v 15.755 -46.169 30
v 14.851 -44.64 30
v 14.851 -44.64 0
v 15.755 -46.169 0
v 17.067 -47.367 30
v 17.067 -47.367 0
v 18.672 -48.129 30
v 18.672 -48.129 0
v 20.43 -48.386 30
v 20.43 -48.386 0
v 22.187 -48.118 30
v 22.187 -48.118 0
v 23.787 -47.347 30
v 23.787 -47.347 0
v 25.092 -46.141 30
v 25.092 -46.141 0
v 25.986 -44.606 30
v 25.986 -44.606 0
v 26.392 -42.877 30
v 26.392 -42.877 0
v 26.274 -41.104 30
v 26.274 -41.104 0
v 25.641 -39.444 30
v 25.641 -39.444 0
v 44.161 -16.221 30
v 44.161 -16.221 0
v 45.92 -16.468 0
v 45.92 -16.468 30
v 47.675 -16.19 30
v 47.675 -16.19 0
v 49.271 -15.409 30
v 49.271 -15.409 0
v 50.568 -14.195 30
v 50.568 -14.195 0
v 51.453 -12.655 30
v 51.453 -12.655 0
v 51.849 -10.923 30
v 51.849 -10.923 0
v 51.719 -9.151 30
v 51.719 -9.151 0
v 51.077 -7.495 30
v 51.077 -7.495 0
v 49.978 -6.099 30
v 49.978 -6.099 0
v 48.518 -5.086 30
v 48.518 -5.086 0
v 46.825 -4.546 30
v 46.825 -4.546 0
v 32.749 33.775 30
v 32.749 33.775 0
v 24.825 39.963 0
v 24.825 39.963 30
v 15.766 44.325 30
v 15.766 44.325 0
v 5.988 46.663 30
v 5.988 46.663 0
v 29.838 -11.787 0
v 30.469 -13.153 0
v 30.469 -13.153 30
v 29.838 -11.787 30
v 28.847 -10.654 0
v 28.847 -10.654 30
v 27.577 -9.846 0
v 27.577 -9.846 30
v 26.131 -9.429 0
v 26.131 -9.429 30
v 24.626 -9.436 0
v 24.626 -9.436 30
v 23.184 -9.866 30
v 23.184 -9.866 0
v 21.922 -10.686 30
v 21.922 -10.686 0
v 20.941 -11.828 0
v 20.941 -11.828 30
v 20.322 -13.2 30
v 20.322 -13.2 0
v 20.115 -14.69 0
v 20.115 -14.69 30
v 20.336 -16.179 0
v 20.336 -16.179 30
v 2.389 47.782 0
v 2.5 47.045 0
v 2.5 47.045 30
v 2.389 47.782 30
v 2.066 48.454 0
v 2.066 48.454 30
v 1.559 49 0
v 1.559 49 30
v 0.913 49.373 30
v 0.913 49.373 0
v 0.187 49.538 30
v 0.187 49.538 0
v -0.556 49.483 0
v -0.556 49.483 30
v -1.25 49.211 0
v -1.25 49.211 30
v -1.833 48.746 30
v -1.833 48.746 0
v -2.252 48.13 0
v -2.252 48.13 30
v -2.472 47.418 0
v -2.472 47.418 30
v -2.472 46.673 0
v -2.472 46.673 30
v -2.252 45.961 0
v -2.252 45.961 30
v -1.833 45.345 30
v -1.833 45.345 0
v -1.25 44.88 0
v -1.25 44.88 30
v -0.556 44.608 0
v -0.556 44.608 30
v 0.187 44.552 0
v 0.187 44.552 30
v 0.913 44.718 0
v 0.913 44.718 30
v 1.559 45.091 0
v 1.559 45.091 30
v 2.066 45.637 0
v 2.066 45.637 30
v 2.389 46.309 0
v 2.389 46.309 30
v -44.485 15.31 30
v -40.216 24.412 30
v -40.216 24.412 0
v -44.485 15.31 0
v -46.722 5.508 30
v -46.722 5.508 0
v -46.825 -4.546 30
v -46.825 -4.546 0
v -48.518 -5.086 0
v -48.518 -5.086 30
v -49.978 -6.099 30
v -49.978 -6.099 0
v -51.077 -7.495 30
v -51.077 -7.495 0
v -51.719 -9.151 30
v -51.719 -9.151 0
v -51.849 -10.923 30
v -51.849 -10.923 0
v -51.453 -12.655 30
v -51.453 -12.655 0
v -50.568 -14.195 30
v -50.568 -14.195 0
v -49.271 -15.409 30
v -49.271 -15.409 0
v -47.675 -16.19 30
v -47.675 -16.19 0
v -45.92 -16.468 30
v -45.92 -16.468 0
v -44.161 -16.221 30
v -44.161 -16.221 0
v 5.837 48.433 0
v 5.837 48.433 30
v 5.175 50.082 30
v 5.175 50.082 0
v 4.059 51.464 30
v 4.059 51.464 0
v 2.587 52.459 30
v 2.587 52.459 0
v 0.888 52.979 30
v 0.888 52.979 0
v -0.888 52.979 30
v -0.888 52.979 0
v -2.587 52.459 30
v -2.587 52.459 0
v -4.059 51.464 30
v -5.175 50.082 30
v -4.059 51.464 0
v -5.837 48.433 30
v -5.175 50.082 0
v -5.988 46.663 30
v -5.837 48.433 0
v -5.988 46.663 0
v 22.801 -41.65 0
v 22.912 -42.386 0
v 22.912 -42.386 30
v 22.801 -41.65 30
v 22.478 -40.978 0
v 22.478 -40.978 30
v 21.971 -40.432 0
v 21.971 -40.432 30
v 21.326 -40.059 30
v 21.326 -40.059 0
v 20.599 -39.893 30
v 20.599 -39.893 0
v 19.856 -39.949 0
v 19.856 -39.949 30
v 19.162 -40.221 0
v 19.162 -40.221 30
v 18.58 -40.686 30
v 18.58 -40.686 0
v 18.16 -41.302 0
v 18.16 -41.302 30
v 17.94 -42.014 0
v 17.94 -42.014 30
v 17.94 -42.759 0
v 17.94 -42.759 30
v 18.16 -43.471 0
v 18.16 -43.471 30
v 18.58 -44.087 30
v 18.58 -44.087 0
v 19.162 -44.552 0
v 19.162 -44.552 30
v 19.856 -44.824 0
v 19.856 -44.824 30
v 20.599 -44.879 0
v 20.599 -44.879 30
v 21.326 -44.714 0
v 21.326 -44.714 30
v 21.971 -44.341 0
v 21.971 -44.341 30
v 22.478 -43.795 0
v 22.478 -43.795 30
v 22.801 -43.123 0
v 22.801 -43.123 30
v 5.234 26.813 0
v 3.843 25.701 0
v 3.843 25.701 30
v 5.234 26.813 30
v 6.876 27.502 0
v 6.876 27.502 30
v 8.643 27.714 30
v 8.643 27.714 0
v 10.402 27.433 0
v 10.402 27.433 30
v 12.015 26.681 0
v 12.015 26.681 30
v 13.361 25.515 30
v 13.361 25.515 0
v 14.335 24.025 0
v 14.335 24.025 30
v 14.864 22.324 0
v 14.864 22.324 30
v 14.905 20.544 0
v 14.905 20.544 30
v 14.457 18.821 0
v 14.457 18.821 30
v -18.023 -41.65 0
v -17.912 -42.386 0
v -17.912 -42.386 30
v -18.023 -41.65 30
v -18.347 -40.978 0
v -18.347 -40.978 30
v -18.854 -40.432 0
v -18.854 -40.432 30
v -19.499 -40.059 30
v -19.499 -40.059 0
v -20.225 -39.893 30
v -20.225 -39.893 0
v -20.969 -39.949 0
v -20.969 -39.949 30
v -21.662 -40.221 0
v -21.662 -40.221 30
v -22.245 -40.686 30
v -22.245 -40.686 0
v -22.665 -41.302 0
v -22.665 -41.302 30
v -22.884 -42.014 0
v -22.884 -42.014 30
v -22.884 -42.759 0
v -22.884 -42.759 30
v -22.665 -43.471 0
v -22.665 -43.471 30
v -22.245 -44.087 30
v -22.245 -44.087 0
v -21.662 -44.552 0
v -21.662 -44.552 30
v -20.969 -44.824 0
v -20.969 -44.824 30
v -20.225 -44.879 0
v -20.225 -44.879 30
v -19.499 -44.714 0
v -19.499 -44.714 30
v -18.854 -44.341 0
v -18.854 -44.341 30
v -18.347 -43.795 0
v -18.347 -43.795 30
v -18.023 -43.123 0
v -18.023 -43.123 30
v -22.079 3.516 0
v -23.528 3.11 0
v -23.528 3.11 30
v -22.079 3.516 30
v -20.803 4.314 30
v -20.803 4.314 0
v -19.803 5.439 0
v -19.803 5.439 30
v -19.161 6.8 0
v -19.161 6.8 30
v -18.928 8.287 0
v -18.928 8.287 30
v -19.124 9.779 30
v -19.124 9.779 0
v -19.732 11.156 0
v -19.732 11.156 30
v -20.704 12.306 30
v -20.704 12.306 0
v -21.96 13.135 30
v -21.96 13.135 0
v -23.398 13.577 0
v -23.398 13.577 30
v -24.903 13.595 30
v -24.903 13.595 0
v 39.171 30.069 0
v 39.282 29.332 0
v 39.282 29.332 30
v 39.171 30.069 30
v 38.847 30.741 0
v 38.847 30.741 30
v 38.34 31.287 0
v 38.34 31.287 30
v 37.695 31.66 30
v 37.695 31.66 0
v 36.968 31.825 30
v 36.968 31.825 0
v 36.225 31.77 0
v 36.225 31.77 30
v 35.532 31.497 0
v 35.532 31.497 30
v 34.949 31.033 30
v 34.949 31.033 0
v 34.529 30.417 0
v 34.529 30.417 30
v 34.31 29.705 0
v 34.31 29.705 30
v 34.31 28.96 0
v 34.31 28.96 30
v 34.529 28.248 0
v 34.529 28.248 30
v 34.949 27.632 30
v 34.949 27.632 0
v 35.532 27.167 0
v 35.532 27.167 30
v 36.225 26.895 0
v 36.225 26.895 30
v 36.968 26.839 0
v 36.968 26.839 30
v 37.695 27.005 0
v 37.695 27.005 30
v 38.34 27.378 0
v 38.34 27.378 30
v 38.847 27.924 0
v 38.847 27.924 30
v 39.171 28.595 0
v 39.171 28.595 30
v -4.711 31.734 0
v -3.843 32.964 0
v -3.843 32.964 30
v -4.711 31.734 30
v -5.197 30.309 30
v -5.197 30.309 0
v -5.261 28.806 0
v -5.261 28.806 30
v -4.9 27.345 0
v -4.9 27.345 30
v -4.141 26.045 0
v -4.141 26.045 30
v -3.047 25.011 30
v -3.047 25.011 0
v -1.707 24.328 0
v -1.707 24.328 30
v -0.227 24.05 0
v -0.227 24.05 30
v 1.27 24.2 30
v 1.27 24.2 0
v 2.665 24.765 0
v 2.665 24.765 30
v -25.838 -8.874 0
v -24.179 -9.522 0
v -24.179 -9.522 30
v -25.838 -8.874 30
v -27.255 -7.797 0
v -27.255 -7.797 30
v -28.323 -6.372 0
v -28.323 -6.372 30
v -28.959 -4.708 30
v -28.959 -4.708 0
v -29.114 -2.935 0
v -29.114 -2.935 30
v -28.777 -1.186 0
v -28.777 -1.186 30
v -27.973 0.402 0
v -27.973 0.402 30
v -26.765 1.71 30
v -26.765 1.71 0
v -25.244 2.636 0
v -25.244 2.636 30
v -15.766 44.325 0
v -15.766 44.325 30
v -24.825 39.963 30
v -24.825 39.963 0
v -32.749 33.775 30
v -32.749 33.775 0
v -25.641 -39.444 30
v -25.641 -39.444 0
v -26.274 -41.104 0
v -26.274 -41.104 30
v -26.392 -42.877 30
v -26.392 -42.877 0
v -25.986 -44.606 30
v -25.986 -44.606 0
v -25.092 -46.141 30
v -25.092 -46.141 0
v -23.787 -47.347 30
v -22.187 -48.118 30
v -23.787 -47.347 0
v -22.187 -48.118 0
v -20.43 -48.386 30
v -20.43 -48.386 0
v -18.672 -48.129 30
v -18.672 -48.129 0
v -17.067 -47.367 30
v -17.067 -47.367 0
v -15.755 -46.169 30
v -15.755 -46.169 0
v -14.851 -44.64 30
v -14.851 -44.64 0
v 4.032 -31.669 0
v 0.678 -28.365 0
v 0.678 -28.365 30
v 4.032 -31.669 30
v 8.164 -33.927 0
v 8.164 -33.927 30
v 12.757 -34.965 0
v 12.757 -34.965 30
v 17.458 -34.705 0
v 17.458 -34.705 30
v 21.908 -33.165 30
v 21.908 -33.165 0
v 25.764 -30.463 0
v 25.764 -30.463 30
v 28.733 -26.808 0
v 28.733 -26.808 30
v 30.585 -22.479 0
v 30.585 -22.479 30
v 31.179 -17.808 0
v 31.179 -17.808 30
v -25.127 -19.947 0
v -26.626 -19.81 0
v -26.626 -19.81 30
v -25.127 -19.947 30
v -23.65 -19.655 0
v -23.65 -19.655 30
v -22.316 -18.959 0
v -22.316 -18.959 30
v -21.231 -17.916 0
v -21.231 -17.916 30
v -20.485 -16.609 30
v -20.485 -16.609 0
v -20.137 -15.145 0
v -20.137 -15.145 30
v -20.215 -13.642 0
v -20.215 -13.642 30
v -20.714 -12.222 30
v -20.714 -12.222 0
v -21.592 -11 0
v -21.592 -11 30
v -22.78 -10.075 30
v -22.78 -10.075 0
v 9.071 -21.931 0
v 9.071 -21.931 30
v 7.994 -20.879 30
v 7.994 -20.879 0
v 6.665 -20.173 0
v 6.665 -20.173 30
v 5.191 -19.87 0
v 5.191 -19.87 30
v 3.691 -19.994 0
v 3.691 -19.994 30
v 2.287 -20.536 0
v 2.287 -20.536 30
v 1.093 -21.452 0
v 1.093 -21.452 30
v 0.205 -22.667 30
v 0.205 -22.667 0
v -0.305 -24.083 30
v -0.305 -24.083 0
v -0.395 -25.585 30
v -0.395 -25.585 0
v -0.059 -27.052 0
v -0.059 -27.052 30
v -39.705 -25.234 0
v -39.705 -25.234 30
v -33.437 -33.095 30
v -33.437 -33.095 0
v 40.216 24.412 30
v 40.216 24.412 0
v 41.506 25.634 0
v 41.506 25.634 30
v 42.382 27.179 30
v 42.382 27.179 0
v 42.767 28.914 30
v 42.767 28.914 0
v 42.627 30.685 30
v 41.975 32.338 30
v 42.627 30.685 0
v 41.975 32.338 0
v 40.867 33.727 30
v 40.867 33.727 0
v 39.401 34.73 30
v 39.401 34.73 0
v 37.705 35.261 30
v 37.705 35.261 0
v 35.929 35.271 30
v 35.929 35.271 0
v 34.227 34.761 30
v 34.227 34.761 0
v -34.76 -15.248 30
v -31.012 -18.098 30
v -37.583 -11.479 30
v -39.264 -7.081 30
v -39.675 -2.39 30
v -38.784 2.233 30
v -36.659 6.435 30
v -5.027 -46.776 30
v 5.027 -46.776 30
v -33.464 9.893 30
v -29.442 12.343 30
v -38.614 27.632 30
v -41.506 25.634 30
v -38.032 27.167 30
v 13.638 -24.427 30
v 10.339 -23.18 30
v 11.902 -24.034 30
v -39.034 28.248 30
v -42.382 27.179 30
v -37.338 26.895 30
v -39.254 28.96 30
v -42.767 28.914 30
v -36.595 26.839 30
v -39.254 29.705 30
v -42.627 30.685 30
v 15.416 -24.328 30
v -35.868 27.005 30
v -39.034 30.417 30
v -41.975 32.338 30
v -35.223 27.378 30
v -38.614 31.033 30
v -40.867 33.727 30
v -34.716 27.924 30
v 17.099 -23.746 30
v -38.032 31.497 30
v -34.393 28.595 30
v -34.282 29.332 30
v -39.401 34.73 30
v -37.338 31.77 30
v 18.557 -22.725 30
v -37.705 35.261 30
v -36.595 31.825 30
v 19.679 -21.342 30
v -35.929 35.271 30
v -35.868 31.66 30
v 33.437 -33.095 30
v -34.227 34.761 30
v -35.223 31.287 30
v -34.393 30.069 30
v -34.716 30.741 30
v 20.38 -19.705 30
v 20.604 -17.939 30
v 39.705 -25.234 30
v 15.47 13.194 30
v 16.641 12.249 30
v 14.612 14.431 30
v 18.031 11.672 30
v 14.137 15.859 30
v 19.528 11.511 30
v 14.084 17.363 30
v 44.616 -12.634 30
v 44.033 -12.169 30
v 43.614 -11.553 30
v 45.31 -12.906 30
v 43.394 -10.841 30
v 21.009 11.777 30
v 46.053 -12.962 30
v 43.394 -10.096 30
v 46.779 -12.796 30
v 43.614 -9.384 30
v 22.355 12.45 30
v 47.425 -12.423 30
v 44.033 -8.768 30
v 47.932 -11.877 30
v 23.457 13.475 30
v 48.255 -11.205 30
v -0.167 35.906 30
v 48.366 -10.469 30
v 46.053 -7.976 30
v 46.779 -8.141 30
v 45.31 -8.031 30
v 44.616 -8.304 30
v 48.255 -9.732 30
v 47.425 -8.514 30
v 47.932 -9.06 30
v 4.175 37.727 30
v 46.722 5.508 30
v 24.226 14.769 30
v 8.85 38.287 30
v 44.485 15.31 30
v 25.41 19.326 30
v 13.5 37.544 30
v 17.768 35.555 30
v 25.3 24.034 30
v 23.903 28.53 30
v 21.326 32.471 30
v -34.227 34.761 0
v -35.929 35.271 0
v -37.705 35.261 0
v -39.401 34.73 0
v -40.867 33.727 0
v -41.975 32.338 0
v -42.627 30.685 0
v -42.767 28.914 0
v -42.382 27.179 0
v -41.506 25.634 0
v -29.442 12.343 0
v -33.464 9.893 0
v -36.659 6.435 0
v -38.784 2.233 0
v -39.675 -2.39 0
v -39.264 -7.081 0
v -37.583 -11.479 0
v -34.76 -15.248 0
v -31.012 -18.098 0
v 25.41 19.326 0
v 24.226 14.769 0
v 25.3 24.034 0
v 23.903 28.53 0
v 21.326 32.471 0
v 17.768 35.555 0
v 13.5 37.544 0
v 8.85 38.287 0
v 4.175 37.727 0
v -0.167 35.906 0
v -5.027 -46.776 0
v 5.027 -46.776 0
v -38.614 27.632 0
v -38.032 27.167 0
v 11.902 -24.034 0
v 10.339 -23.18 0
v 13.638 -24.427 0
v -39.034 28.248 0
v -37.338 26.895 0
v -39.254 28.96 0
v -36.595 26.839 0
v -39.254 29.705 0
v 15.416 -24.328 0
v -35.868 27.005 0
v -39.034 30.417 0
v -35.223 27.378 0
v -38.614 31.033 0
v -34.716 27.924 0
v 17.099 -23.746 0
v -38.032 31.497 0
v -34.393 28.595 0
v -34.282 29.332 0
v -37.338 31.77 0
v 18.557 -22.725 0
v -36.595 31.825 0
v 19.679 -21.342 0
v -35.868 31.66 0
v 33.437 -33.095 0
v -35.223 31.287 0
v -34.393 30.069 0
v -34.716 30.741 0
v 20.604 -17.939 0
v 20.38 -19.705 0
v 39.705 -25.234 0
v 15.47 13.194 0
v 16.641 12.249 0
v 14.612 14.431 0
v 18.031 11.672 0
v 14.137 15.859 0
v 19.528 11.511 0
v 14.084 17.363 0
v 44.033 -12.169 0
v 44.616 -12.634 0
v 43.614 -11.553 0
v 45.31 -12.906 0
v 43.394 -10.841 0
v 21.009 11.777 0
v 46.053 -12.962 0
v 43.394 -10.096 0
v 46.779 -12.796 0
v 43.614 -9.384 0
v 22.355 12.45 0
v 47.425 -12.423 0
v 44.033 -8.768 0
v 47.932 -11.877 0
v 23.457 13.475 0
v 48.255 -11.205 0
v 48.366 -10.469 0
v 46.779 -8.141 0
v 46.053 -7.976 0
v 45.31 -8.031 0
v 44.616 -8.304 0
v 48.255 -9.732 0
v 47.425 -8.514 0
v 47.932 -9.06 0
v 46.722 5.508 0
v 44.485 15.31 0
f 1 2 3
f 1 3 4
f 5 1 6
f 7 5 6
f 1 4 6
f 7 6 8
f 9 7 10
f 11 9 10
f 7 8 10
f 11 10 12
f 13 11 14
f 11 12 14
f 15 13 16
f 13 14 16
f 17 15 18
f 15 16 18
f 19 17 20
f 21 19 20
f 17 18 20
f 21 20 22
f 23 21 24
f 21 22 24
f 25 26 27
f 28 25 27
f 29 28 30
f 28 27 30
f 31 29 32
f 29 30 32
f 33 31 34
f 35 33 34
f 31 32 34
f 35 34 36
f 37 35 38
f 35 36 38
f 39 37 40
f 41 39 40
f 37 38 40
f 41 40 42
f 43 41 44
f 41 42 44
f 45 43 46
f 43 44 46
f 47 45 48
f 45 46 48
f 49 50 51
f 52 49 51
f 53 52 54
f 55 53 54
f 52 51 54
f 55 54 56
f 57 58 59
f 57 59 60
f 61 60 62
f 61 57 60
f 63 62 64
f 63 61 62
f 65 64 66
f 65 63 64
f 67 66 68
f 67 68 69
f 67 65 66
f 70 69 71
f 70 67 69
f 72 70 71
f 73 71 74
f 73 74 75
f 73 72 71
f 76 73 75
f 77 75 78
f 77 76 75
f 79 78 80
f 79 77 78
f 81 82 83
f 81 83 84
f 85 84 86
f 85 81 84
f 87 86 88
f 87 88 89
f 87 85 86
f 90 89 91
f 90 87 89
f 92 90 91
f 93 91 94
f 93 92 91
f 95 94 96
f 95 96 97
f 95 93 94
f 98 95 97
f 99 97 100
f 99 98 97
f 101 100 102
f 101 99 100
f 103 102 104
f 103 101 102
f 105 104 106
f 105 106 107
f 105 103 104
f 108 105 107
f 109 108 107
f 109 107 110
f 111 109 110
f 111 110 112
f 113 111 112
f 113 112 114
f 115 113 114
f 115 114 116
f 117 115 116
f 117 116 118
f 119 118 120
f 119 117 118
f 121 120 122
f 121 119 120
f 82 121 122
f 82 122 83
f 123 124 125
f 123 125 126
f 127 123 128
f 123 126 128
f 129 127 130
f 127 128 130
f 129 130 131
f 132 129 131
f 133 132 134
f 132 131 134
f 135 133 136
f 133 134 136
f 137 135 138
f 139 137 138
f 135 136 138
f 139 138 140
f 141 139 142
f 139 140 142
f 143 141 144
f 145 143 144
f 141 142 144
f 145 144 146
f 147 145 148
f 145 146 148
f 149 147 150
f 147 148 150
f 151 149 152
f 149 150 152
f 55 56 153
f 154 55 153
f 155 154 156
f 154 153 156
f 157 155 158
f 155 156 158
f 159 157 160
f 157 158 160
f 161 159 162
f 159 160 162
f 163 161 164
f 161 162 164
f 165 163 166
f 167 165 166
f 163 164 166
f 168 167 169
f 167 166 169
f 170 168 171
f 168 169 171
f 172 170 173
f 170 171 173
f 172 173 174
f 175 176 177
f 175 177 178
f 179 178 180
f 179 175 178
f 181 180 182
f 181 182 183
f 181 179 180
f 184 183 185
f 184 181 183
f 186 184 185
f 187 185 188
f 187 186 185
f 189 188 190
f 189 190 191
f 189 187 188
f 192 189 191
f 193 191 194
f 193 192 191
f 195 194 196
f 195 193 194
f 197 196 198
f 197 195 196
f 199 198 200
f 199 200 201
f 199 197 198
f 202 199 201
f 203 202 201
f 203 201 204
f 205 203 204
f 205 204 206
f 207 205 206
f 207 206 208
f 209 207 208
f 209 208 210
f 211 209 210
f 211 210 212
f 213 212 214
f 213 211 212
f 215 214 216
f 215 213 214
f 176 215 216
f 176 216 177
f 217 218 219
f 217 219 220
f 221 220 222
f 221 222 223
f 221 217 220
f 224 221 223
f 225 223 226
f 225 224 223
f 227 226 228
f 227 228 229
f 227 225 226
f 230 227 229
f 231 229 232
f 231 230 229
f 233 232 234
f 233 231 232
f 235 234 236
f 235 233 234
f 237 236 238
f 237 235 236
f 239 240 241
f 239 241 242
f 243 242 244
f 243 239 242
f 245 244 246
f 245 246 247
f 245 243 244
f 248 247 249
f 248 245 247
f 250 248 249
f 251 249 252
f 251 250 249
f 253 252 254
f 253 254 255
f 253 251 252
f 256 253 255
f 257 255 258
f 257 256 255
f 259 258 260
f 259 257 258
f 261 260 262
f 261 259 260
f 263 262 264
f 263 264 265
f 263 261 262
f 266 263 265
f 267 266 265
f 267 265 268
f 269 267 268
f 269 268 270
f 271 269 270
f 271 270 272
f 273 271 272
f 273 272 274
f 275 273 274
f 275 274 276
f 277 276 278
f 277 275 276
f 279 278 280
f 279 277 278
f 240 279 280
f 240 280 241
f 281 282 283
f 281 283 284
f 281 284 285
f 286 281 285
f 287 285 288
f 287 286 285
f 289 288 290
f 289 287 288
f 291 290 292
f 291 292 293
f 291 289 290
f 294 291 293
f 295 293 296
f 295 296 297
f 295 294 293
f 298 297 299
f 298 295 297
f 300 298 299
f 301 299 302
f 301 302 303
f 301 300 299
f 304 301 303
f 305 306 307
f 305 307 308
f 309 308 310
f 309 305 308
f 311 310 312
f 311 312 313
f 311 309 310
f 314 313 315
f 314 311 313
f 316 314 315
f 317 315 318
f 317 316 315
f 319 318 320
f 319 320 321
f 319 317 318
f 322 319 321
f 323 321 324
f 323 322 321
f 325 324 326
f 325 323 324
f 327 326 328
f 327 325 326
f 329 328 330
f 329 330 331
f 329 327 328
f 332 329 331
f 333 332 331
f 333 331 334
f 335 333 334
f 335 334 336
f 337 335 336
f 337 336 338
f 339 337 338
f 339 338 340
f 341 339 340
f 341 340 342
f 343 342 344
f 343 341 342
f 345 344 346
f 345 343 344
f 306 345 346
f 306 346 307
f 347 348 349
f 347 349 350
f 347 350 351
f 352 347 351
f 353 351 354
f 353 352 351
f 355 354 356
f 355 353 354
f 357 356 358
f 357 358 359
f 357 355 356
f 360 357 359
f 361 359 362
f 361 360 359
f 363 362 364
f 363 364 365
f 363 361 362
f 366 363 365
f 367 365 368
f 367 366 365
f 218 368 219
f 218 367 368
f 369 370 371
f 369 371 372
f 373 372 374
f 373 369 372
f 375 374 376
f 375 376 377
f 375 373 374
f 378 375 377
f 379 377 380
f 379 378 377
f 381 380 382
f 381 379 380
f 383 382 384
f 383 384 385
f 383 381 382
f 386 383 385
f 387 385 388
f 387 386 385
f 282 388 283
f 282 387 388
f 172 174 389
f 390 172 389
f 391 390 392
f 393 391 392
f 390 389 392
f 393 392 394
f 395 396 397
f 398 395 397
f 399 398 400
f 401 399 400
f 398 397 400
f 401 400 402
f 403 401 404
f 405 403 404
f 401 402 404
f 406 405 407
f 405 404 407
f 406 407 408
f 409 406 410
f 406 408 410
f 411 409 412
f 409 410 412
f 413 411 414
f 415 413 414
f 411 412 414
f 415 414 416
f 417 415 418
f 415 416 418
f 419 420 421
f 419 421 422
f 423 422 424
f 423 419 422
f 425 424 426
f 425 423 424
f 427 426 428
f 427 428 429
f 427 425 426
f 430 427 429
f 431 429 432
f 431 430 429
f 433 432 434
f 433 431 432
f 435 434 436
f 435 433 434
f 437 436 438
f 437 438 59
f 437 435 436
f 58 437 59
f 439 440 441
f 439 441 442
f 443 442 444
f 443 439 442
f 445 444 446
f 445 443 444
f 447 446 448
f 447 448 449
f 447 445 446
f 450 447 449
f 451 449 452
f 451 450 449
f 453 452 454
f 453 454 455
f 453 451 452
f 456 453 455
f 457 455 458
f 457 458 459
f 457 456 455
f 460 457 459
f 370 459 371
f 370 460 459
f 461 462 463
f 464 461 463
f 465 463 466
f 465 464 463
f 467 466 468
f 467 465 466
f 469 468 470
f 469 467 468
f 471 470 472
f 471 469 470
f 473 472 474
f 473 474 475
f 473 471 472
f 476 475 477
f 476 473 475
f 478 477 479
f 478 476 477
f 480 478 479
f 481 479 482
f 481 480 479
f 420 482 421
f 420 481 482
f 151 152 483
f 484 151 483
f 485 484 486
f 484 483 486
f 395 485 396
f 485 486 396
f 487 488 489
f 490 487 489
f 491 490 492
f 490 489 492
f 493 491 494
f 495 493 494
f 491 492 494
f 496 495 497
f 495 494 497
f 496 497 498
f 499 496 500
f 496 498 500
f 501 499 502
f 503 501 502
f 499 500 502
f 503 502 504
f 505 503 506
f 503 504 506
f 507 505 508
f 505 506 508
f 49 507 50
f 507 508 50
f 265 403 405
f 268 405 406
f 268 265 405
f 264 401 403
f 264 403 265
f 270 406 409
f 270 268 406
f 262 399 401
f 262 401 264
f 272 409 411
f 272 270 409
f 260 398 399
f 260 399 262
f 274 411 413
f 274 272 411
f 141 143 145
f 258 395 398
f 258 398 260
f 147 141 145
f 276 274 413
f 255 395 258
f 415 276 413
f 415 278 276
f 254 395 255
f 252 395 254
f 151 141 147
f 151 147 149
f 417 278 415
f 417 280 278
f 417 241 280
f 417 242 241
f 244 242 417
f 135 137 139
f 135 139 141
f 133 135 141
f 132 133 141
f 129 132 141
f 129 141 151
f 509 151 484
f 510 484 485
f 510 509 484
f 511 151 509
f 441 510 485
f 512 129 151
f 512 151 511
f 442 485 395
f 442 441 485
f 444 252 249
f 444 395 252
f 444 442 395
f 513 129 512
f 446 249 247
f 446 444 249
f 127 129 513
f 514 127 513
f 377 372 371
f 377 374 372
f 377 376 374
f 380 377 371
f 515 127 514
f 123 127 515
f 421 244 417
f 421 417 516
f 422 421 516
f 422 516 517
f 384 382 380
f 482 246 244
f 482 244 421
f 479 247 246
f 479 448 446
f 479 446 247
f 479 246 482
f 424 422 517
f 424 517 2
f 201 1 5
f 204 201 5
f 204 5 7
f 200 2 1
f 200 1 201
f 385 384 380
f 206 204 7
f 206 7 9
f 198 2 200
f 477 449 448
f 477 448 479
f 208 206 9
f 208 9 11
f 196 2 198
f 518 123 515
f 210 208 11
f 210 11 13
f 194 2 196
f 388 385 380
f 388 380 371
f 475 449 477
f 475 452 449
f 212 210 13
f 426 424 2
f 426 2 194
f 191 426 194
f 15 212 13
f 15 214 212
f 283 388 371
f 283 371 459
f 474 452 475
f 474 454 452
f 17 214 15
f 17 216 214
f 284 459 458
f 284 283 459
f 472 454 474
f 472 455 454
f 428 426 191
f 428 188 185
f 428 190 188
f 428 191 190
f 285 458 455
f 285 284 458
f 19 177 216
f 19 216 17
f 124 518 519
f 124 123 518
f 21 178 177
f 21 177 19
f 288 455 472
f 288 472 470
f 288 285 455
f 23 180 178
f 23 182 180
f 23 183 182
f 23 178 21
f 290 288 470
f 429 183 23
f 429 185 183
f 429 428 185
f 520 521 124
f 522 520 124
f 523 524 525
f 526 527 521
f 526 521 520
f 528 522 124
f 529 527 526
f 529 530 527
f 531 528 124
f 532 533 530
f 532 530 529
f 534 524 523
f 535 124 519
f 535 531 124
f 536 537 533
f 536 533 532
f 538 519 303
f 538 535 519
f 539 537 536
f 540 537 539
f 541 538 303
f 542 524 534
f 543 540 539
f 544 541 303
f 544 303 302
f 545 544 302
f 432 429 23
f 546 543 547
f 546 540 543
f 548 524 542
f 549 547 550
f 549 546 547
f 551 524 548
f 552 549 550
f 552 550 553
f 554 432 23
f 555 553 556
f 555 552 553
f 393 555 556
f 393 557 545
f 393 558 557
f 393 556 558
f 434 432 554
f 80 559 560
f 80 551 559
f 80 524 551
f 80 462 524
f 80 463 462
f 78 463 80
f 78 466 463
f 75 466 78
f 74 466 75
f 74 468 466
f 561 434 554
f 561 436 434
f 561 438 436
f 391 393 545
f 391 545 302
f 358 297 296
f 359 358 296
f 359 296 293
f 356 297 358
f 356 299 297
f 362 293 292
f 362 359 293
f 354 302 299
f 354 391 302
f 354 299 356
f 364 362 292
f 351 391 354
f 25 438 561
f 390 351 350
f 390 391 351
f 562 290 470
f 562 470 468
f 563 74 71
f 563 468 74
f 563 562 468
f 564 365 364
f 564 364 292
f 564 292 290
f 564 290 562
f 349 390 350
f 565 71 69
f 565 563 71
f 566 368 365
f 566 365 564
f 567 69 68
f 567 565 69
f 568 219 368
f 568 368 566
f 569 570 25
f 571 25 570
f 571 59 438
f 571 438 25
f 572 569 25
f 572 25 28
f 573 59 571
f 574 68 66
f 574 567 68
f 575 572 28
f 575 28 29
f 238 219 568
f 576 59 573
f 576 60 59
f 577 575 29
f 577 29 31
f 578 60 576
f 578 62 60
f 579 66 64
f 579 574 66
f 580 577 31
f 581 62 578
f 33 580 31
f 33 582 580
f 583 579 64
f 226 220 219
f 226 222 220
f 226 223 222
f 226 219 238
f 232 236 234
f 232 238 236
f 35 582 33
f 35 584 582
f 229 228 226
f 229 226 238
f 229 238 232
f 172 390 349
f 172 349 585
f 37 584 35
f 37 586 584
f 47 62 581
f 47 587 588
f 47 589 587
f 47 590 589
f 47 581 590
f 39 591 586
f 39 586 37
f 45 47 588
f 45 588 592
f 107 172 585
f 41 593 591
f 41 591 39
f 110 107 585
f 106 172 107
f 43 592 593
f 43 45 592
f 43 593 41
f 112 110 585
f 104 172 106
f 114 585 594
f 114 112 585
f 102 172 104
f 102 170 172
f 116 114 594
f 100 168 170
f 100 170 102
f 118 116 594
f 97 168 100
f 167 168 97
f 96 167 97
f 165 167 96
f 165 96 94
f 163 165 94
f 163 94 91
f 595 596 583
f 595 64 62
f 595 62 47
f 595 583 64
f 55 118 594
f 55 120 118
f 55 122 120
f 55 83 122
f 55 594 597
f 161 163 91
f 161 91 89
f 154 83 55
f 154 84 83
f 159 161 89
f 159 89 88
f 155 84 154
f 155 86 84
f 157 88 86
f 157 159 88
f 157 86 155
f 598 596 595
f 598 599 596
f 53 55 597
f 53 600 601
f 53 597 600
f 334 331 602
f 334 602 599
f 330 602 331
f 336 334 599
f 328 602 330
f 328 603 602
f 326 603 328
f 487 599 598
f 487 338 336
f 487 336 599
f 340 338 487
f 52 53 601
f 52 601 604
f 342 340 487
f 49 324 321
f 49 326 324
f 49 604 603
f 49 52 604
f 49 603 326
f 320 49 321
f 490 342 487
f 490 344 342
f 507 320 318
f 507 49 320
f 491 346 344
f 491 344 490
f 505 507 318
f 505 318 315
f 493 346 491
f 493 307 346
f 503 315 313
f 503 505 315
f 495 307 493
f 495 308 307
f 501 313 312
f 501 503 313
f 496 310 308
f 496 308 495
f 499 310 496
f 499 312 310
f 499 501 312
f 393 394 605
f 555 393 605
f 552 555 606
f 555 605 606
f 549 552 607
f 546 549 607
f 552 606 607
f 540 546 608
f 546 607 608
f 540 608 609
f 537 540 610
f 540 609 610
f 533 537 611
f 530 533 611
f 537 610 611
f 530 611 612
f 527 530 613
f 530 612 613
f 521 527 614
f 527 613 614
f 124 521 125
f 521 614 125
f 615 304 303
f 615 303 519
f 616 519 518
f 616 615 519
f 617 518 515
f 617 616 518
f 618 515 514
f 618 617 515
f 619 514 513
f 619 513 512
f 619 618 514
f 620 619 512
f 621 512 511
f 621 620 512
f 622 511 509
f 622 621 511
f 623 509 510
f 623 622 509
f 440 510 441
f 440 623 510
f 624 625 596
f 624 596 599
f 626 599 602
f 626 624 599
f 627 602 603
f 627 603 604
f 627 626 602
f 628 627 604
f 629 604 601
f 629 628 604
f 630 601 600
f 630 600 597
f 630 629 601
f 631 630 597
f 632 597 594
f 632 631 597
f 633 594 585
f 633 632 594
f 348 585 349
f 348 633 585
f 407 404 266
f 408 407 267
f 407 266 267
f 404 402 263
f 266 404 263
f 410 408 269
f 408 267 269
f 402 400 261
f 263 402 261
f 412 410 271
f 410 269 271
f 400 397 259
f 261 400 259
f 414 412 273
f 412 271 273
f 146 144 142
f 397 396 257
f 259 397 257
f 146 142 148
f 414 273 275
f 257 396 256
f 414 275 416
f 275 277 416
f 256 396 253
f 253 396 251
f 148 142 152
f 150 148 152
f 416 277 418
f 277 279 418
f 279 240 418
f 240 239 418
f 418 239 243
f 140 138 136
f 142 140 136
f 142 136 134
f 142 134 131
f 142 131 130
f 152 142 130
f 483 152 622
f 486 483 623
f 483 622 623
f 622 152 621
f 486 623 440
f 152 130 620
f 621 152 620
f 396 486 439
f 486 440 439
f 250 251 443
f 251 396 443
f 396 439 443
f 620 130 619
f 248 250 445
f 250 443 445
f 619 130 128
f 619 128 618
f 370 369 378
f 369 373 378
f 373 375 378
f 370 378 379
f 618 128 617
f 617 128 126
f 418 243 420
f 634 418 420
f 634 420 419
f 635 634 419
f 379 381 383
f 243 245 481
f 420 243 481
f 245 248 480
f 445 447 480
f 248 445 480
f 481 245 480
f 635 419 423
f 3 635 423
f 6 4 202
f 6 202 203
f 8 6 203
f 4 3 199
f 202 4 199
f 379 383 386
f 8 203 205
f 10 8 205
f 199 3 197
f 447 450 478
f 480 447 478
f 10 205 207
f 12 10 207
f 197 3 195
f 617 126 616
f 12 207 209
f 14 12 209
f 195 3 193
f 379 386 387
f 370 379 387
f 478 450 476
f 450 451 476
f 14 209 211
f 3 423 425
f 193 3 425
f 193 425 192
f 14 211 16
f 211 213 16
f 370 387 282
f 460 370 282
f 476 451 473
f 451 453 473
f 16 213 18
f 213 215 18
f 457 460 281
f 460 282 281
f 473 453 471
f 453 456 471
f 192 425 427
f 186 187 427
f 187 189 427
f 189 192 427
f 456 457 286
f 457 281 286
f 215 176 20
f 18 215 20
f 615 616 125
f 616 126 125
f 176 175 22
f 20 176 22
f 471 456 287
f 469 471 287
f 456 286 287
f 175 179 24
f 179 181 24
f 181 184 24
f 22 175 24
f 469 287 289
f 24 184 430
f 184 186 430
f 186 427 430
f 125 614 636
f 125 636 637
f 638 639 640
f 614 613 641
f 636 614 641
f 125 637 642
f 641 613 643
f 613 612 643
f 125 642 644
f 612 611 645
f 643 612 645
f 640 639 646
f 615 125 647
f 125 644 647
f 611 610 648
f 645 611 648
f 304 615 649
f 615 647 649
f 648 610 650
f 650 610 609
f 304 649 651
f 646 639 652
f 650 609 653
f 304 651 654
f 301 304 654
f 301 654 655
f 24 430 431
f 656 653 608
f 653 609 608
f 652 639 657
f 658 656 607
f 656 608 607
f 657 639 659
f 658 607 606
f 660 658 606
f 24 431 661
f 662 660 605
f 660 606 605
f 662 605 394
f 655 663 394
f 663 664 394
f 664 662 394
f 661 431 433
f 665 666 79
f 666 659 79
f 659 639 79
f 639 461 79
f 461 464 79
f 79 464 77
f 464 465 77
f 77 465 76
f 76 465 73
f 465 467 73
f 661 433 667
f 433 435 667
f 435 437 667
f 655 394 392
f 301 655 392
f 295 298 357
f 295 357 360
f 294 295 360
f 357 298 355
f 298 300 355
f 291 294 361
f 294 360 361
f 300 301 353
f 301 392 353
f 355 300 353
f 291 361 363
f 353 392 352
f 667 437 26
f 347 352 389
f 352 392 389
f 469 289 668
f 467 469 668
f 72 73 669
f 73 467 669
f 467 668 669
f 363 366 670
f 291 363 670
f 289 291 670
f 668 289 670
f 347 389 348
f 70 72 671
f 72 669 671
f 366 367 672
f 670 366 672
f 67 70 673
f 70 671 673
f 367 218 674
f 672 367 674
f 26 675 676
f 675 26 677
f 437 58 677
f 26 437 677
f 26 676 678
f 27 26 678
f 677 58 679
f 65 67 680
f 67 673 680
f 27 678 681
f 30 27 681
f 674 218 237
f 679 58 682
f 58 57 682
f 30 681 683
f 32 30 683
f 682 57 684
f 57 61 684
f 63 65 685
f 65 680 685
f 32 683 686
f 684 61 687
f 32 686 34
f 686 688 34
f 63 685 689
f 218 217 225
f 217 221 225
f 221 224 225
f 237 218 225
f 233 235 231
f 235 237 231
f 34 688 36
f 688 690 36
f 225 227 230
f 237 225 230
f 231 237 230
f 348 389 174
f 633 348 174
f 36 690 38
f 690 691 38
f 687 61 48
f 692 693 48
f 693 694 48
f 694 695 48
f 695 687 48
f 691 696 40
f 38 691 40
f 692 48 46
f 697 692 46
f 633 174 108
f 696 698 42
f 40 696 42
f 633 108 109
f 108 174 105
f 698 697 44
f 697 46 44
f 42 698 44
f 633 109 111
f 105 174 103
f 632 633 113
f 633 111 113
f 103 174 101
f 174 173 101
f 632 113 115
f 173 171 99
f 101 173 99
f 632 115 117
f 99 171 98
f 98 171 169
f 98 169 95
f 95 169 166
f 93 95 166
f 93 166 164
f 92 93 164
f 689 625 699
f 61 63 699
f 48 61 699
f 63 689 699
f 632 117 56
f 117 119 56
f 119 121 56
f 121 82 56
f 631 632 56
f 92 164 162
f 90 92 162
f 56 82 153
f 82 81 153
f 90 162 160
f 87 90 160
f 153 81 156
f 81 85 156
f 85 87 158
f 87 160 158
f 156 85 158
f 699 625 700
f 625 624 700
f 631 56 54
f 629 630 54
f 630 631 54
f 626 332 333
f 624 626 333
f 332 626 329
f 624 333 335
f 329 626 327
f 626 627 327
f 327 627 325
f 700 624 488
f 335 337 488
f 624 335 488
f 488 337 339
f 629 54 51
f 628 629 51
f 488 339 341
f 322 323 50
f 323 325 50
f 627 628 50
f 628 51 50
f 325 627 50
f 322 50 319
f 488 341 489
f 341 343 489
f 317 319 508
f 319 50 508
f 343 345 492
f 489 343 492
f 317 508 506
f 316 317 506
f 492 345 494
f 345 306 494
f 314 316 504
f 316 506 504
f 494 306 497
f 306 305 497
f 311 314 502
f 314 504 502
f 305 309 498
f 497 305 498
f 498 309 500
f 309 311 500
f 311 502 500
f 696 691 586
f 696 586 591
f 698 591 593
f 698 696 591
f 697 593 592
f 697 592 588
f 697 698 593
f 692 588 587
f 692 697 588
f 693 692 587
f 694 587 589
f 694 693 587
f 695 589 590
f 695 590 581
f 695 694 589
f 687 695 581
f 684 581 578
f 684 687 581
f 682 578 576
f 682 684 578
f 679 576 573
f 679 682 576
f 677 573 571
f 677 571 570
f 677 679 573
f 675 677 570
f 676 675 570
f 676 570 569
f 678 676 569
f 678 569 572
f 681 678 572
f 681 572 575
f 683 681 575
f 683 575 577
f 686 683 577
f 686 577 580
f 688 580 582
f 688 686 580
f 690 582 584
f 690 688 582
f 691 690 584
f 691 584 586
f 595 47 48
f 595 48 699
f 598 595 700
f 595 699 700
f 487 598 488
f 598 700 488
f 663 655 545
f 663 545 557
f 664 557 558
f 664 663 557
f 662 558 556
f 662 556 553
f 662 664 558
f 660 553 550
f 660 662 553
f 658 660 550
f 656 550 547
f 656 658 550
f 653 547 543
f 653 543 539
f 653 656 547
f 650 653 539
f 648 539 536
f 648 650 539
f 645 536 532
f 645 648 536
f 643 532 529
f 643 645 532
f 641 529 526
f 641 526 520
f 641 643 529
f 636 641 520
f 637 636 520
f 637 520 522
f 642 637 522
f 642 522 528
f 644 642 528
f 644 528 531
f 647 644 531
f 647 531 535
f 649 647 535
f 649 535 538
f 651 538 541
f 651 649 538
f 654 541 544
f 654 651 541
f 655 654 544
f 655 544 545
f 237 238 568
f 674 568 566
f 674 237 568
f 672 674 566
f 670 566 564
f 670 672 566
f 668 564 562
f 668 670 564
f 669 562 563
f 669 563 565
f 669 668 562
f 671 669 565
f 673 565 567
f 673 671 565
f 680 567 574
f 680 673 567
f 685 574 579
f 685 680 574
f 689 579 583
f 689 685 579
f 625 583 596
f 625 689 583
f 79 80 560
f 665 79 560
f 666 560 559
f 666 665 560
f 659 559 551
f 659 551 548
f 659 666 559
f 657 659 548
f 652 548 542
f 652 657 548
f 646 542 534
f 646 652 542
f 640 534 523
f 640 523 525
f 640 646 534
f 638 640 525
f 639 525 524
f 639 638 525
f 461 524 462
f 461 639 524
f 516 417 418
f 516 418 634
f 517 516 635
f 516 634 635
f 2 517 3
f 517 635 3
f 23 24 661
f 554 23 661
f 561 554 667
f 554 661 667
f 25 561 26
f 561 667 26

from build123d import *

# Parameters (mm, degrees)
SKETCH1_R           = 2.5
BOSS_EXTRUDE1_DEPTH = 30


with BuildPart() as part:
    # Sketch1 → Boss-Extrude1 (new body)
    with BuildSketch(Plane.XY):
        with BuildLine():
            ThreePointArc((5.987788455, 46.66284585), (0, 53.045454545), (-5.987788455, 46.66284585))
            ThreePointArc((-5.987788455, 46.66284585), (-20.412257727, 42.386489922), (-32.749156909, 33.775250038))
            ThreePointArc((-32.749156909, 33.775250038), (-41.472606365, 33.073299944), (-40.215806985, 24.412366988))
            ThreePointArc((-40.215806985, 24.412366988), (-45.865926778, 10.468598484), (-46.82531916, -4.545797942))
            ThreePointArc((-46.82531916, -4.545797942), (-51.715494251, -11.803724088), (-44.160502601, -16.221122137))
            ThreePointArc((-44.160502601, -16.221122137), (-36.781617471, -29.332361133), (-25.641061021, -39.443767354))
            ThreePointArc((-25.641061021, -39.443767354), (-23.015560161, -47.792303129), (-14.851439049, -44.639775442))
            ThreePointArc((-14.851439049, -44.639775442), (0, -47.045454545), (14.851439049, -44.639775442))
            ThreePointArc((14.851439049, -44.639775442), (23.015560161, -47.792303129), (25.641061021, -39.443767354))
            ThreePointArc((25.641061021, -39.443767354), (36.781617471, -29.332361133), (44.160502601, -16.221122137))
            ThreePointArc((44.160502601, -16.221122137), (51.715494251, -11.803724088), (46.82531916, -4.545797942))
            ThreePointArc((46.82531916, -4.545797942), (45.865926778, 10.468598484), (40.215806985, 24.412366988))
            ThreePointArc((40.215806985, 24.412366988), (41.472606365, 33.073299944), (32.749156909, 33.775250038))
            ThreePointArc((32.749156909, 33.775250038), (20.412257727, 42.386489922), (5.987788455, 46.66284585))
        make_face()
        with Locations((0, 47.045454545)):
            Circle(SKETCH1_R, mode=Mode.SUBTRACT)
        with Locations((36.781617471, 29.332361133)):
            Circle(SKETCH1_R, mode=Mode.SUBTRACT)
        with Locations((45.865926778, -10.468598484)):
            Circle(SKETCH1_R, mode=Mode.SUBTRACT)
        with Locations((20.412257727, -42.386489922)):
            Circle(SKETCH1_R, mode=Mode.SUBTRACT)
        with Locations((-20.412257727, -42.386489922)):
            Circle(SKETCH1_R, mode=Mode.SUBTRACT)
        with Locations((-36.781617471, 29.332361133)):
            Circle(SKETCH1_R, mode=Mode.SUBTRACT)
        with BuildLine():
            ThreePointArc((0.677628824, -28.364607267), (21.907582959, -33.164561623), (30.469177048, -13.153324254))
            ThreePointArc((30.469177048, -13.153324254), (23.889713582, -9.599573413), (20.33596274, -16.179036879))
            ThreePointArc((20.33596274, -16.179036879), (17.098534821, -23.745961668), (9.070772057, -21.930936793))
            ThreePointArc((9.070772057, -21.930936793), (1.657365204, -20.951200413), (0.677628824, -28.364607267))
        make_face(mode=Mode.SUBTRACT)
        with BuildLine():
            ThreePointArc((24.225656049, 14.769147409), (17.767561392, 35.554804189), (-3.843475576, 32.963743483))
            ThreePointArc((-3.843475576, 32.963743483), (-3.63138235, 25.488885557), (3.843475576, 25.700978783))
            ThreePointArc((3.843475576, 25.700978783), (12.015338631, 26.680746357), (14.457362363, 18.82098743))
            ThreePointArc((14.457362363, 18.82098743), (17.315589196, 11.910920576), (24.225656049, 14.769147409))
        make_face(mode=Mode.SUBTRACT)
        with BuildLine():
            ThreePointArc((-24.903284873, 13.595459858), (-39.67514435, -2.390242566), (-26.625701472, -19.810419229))
            ThreePointArc((-26.625701472, -19.810419229), (-20.258331232, -15.889312144), (-24.179438316, -9.521941904))
            ThreePointArc((-24.179438316, -9.521941904), (-29.113873453, -2.934784689), (-23.52813442, 3.109949364))
            ThreePointArc((-23.52813442, 3.109949364), (-18.9729544, 9.040279837), (-24.903284873, 13.595459858))
        make_face(mode=Mode.SUBTRACT)
    extrude(amount=BOSS_EXTRUDE1_DEPTH)


solid = part.part
